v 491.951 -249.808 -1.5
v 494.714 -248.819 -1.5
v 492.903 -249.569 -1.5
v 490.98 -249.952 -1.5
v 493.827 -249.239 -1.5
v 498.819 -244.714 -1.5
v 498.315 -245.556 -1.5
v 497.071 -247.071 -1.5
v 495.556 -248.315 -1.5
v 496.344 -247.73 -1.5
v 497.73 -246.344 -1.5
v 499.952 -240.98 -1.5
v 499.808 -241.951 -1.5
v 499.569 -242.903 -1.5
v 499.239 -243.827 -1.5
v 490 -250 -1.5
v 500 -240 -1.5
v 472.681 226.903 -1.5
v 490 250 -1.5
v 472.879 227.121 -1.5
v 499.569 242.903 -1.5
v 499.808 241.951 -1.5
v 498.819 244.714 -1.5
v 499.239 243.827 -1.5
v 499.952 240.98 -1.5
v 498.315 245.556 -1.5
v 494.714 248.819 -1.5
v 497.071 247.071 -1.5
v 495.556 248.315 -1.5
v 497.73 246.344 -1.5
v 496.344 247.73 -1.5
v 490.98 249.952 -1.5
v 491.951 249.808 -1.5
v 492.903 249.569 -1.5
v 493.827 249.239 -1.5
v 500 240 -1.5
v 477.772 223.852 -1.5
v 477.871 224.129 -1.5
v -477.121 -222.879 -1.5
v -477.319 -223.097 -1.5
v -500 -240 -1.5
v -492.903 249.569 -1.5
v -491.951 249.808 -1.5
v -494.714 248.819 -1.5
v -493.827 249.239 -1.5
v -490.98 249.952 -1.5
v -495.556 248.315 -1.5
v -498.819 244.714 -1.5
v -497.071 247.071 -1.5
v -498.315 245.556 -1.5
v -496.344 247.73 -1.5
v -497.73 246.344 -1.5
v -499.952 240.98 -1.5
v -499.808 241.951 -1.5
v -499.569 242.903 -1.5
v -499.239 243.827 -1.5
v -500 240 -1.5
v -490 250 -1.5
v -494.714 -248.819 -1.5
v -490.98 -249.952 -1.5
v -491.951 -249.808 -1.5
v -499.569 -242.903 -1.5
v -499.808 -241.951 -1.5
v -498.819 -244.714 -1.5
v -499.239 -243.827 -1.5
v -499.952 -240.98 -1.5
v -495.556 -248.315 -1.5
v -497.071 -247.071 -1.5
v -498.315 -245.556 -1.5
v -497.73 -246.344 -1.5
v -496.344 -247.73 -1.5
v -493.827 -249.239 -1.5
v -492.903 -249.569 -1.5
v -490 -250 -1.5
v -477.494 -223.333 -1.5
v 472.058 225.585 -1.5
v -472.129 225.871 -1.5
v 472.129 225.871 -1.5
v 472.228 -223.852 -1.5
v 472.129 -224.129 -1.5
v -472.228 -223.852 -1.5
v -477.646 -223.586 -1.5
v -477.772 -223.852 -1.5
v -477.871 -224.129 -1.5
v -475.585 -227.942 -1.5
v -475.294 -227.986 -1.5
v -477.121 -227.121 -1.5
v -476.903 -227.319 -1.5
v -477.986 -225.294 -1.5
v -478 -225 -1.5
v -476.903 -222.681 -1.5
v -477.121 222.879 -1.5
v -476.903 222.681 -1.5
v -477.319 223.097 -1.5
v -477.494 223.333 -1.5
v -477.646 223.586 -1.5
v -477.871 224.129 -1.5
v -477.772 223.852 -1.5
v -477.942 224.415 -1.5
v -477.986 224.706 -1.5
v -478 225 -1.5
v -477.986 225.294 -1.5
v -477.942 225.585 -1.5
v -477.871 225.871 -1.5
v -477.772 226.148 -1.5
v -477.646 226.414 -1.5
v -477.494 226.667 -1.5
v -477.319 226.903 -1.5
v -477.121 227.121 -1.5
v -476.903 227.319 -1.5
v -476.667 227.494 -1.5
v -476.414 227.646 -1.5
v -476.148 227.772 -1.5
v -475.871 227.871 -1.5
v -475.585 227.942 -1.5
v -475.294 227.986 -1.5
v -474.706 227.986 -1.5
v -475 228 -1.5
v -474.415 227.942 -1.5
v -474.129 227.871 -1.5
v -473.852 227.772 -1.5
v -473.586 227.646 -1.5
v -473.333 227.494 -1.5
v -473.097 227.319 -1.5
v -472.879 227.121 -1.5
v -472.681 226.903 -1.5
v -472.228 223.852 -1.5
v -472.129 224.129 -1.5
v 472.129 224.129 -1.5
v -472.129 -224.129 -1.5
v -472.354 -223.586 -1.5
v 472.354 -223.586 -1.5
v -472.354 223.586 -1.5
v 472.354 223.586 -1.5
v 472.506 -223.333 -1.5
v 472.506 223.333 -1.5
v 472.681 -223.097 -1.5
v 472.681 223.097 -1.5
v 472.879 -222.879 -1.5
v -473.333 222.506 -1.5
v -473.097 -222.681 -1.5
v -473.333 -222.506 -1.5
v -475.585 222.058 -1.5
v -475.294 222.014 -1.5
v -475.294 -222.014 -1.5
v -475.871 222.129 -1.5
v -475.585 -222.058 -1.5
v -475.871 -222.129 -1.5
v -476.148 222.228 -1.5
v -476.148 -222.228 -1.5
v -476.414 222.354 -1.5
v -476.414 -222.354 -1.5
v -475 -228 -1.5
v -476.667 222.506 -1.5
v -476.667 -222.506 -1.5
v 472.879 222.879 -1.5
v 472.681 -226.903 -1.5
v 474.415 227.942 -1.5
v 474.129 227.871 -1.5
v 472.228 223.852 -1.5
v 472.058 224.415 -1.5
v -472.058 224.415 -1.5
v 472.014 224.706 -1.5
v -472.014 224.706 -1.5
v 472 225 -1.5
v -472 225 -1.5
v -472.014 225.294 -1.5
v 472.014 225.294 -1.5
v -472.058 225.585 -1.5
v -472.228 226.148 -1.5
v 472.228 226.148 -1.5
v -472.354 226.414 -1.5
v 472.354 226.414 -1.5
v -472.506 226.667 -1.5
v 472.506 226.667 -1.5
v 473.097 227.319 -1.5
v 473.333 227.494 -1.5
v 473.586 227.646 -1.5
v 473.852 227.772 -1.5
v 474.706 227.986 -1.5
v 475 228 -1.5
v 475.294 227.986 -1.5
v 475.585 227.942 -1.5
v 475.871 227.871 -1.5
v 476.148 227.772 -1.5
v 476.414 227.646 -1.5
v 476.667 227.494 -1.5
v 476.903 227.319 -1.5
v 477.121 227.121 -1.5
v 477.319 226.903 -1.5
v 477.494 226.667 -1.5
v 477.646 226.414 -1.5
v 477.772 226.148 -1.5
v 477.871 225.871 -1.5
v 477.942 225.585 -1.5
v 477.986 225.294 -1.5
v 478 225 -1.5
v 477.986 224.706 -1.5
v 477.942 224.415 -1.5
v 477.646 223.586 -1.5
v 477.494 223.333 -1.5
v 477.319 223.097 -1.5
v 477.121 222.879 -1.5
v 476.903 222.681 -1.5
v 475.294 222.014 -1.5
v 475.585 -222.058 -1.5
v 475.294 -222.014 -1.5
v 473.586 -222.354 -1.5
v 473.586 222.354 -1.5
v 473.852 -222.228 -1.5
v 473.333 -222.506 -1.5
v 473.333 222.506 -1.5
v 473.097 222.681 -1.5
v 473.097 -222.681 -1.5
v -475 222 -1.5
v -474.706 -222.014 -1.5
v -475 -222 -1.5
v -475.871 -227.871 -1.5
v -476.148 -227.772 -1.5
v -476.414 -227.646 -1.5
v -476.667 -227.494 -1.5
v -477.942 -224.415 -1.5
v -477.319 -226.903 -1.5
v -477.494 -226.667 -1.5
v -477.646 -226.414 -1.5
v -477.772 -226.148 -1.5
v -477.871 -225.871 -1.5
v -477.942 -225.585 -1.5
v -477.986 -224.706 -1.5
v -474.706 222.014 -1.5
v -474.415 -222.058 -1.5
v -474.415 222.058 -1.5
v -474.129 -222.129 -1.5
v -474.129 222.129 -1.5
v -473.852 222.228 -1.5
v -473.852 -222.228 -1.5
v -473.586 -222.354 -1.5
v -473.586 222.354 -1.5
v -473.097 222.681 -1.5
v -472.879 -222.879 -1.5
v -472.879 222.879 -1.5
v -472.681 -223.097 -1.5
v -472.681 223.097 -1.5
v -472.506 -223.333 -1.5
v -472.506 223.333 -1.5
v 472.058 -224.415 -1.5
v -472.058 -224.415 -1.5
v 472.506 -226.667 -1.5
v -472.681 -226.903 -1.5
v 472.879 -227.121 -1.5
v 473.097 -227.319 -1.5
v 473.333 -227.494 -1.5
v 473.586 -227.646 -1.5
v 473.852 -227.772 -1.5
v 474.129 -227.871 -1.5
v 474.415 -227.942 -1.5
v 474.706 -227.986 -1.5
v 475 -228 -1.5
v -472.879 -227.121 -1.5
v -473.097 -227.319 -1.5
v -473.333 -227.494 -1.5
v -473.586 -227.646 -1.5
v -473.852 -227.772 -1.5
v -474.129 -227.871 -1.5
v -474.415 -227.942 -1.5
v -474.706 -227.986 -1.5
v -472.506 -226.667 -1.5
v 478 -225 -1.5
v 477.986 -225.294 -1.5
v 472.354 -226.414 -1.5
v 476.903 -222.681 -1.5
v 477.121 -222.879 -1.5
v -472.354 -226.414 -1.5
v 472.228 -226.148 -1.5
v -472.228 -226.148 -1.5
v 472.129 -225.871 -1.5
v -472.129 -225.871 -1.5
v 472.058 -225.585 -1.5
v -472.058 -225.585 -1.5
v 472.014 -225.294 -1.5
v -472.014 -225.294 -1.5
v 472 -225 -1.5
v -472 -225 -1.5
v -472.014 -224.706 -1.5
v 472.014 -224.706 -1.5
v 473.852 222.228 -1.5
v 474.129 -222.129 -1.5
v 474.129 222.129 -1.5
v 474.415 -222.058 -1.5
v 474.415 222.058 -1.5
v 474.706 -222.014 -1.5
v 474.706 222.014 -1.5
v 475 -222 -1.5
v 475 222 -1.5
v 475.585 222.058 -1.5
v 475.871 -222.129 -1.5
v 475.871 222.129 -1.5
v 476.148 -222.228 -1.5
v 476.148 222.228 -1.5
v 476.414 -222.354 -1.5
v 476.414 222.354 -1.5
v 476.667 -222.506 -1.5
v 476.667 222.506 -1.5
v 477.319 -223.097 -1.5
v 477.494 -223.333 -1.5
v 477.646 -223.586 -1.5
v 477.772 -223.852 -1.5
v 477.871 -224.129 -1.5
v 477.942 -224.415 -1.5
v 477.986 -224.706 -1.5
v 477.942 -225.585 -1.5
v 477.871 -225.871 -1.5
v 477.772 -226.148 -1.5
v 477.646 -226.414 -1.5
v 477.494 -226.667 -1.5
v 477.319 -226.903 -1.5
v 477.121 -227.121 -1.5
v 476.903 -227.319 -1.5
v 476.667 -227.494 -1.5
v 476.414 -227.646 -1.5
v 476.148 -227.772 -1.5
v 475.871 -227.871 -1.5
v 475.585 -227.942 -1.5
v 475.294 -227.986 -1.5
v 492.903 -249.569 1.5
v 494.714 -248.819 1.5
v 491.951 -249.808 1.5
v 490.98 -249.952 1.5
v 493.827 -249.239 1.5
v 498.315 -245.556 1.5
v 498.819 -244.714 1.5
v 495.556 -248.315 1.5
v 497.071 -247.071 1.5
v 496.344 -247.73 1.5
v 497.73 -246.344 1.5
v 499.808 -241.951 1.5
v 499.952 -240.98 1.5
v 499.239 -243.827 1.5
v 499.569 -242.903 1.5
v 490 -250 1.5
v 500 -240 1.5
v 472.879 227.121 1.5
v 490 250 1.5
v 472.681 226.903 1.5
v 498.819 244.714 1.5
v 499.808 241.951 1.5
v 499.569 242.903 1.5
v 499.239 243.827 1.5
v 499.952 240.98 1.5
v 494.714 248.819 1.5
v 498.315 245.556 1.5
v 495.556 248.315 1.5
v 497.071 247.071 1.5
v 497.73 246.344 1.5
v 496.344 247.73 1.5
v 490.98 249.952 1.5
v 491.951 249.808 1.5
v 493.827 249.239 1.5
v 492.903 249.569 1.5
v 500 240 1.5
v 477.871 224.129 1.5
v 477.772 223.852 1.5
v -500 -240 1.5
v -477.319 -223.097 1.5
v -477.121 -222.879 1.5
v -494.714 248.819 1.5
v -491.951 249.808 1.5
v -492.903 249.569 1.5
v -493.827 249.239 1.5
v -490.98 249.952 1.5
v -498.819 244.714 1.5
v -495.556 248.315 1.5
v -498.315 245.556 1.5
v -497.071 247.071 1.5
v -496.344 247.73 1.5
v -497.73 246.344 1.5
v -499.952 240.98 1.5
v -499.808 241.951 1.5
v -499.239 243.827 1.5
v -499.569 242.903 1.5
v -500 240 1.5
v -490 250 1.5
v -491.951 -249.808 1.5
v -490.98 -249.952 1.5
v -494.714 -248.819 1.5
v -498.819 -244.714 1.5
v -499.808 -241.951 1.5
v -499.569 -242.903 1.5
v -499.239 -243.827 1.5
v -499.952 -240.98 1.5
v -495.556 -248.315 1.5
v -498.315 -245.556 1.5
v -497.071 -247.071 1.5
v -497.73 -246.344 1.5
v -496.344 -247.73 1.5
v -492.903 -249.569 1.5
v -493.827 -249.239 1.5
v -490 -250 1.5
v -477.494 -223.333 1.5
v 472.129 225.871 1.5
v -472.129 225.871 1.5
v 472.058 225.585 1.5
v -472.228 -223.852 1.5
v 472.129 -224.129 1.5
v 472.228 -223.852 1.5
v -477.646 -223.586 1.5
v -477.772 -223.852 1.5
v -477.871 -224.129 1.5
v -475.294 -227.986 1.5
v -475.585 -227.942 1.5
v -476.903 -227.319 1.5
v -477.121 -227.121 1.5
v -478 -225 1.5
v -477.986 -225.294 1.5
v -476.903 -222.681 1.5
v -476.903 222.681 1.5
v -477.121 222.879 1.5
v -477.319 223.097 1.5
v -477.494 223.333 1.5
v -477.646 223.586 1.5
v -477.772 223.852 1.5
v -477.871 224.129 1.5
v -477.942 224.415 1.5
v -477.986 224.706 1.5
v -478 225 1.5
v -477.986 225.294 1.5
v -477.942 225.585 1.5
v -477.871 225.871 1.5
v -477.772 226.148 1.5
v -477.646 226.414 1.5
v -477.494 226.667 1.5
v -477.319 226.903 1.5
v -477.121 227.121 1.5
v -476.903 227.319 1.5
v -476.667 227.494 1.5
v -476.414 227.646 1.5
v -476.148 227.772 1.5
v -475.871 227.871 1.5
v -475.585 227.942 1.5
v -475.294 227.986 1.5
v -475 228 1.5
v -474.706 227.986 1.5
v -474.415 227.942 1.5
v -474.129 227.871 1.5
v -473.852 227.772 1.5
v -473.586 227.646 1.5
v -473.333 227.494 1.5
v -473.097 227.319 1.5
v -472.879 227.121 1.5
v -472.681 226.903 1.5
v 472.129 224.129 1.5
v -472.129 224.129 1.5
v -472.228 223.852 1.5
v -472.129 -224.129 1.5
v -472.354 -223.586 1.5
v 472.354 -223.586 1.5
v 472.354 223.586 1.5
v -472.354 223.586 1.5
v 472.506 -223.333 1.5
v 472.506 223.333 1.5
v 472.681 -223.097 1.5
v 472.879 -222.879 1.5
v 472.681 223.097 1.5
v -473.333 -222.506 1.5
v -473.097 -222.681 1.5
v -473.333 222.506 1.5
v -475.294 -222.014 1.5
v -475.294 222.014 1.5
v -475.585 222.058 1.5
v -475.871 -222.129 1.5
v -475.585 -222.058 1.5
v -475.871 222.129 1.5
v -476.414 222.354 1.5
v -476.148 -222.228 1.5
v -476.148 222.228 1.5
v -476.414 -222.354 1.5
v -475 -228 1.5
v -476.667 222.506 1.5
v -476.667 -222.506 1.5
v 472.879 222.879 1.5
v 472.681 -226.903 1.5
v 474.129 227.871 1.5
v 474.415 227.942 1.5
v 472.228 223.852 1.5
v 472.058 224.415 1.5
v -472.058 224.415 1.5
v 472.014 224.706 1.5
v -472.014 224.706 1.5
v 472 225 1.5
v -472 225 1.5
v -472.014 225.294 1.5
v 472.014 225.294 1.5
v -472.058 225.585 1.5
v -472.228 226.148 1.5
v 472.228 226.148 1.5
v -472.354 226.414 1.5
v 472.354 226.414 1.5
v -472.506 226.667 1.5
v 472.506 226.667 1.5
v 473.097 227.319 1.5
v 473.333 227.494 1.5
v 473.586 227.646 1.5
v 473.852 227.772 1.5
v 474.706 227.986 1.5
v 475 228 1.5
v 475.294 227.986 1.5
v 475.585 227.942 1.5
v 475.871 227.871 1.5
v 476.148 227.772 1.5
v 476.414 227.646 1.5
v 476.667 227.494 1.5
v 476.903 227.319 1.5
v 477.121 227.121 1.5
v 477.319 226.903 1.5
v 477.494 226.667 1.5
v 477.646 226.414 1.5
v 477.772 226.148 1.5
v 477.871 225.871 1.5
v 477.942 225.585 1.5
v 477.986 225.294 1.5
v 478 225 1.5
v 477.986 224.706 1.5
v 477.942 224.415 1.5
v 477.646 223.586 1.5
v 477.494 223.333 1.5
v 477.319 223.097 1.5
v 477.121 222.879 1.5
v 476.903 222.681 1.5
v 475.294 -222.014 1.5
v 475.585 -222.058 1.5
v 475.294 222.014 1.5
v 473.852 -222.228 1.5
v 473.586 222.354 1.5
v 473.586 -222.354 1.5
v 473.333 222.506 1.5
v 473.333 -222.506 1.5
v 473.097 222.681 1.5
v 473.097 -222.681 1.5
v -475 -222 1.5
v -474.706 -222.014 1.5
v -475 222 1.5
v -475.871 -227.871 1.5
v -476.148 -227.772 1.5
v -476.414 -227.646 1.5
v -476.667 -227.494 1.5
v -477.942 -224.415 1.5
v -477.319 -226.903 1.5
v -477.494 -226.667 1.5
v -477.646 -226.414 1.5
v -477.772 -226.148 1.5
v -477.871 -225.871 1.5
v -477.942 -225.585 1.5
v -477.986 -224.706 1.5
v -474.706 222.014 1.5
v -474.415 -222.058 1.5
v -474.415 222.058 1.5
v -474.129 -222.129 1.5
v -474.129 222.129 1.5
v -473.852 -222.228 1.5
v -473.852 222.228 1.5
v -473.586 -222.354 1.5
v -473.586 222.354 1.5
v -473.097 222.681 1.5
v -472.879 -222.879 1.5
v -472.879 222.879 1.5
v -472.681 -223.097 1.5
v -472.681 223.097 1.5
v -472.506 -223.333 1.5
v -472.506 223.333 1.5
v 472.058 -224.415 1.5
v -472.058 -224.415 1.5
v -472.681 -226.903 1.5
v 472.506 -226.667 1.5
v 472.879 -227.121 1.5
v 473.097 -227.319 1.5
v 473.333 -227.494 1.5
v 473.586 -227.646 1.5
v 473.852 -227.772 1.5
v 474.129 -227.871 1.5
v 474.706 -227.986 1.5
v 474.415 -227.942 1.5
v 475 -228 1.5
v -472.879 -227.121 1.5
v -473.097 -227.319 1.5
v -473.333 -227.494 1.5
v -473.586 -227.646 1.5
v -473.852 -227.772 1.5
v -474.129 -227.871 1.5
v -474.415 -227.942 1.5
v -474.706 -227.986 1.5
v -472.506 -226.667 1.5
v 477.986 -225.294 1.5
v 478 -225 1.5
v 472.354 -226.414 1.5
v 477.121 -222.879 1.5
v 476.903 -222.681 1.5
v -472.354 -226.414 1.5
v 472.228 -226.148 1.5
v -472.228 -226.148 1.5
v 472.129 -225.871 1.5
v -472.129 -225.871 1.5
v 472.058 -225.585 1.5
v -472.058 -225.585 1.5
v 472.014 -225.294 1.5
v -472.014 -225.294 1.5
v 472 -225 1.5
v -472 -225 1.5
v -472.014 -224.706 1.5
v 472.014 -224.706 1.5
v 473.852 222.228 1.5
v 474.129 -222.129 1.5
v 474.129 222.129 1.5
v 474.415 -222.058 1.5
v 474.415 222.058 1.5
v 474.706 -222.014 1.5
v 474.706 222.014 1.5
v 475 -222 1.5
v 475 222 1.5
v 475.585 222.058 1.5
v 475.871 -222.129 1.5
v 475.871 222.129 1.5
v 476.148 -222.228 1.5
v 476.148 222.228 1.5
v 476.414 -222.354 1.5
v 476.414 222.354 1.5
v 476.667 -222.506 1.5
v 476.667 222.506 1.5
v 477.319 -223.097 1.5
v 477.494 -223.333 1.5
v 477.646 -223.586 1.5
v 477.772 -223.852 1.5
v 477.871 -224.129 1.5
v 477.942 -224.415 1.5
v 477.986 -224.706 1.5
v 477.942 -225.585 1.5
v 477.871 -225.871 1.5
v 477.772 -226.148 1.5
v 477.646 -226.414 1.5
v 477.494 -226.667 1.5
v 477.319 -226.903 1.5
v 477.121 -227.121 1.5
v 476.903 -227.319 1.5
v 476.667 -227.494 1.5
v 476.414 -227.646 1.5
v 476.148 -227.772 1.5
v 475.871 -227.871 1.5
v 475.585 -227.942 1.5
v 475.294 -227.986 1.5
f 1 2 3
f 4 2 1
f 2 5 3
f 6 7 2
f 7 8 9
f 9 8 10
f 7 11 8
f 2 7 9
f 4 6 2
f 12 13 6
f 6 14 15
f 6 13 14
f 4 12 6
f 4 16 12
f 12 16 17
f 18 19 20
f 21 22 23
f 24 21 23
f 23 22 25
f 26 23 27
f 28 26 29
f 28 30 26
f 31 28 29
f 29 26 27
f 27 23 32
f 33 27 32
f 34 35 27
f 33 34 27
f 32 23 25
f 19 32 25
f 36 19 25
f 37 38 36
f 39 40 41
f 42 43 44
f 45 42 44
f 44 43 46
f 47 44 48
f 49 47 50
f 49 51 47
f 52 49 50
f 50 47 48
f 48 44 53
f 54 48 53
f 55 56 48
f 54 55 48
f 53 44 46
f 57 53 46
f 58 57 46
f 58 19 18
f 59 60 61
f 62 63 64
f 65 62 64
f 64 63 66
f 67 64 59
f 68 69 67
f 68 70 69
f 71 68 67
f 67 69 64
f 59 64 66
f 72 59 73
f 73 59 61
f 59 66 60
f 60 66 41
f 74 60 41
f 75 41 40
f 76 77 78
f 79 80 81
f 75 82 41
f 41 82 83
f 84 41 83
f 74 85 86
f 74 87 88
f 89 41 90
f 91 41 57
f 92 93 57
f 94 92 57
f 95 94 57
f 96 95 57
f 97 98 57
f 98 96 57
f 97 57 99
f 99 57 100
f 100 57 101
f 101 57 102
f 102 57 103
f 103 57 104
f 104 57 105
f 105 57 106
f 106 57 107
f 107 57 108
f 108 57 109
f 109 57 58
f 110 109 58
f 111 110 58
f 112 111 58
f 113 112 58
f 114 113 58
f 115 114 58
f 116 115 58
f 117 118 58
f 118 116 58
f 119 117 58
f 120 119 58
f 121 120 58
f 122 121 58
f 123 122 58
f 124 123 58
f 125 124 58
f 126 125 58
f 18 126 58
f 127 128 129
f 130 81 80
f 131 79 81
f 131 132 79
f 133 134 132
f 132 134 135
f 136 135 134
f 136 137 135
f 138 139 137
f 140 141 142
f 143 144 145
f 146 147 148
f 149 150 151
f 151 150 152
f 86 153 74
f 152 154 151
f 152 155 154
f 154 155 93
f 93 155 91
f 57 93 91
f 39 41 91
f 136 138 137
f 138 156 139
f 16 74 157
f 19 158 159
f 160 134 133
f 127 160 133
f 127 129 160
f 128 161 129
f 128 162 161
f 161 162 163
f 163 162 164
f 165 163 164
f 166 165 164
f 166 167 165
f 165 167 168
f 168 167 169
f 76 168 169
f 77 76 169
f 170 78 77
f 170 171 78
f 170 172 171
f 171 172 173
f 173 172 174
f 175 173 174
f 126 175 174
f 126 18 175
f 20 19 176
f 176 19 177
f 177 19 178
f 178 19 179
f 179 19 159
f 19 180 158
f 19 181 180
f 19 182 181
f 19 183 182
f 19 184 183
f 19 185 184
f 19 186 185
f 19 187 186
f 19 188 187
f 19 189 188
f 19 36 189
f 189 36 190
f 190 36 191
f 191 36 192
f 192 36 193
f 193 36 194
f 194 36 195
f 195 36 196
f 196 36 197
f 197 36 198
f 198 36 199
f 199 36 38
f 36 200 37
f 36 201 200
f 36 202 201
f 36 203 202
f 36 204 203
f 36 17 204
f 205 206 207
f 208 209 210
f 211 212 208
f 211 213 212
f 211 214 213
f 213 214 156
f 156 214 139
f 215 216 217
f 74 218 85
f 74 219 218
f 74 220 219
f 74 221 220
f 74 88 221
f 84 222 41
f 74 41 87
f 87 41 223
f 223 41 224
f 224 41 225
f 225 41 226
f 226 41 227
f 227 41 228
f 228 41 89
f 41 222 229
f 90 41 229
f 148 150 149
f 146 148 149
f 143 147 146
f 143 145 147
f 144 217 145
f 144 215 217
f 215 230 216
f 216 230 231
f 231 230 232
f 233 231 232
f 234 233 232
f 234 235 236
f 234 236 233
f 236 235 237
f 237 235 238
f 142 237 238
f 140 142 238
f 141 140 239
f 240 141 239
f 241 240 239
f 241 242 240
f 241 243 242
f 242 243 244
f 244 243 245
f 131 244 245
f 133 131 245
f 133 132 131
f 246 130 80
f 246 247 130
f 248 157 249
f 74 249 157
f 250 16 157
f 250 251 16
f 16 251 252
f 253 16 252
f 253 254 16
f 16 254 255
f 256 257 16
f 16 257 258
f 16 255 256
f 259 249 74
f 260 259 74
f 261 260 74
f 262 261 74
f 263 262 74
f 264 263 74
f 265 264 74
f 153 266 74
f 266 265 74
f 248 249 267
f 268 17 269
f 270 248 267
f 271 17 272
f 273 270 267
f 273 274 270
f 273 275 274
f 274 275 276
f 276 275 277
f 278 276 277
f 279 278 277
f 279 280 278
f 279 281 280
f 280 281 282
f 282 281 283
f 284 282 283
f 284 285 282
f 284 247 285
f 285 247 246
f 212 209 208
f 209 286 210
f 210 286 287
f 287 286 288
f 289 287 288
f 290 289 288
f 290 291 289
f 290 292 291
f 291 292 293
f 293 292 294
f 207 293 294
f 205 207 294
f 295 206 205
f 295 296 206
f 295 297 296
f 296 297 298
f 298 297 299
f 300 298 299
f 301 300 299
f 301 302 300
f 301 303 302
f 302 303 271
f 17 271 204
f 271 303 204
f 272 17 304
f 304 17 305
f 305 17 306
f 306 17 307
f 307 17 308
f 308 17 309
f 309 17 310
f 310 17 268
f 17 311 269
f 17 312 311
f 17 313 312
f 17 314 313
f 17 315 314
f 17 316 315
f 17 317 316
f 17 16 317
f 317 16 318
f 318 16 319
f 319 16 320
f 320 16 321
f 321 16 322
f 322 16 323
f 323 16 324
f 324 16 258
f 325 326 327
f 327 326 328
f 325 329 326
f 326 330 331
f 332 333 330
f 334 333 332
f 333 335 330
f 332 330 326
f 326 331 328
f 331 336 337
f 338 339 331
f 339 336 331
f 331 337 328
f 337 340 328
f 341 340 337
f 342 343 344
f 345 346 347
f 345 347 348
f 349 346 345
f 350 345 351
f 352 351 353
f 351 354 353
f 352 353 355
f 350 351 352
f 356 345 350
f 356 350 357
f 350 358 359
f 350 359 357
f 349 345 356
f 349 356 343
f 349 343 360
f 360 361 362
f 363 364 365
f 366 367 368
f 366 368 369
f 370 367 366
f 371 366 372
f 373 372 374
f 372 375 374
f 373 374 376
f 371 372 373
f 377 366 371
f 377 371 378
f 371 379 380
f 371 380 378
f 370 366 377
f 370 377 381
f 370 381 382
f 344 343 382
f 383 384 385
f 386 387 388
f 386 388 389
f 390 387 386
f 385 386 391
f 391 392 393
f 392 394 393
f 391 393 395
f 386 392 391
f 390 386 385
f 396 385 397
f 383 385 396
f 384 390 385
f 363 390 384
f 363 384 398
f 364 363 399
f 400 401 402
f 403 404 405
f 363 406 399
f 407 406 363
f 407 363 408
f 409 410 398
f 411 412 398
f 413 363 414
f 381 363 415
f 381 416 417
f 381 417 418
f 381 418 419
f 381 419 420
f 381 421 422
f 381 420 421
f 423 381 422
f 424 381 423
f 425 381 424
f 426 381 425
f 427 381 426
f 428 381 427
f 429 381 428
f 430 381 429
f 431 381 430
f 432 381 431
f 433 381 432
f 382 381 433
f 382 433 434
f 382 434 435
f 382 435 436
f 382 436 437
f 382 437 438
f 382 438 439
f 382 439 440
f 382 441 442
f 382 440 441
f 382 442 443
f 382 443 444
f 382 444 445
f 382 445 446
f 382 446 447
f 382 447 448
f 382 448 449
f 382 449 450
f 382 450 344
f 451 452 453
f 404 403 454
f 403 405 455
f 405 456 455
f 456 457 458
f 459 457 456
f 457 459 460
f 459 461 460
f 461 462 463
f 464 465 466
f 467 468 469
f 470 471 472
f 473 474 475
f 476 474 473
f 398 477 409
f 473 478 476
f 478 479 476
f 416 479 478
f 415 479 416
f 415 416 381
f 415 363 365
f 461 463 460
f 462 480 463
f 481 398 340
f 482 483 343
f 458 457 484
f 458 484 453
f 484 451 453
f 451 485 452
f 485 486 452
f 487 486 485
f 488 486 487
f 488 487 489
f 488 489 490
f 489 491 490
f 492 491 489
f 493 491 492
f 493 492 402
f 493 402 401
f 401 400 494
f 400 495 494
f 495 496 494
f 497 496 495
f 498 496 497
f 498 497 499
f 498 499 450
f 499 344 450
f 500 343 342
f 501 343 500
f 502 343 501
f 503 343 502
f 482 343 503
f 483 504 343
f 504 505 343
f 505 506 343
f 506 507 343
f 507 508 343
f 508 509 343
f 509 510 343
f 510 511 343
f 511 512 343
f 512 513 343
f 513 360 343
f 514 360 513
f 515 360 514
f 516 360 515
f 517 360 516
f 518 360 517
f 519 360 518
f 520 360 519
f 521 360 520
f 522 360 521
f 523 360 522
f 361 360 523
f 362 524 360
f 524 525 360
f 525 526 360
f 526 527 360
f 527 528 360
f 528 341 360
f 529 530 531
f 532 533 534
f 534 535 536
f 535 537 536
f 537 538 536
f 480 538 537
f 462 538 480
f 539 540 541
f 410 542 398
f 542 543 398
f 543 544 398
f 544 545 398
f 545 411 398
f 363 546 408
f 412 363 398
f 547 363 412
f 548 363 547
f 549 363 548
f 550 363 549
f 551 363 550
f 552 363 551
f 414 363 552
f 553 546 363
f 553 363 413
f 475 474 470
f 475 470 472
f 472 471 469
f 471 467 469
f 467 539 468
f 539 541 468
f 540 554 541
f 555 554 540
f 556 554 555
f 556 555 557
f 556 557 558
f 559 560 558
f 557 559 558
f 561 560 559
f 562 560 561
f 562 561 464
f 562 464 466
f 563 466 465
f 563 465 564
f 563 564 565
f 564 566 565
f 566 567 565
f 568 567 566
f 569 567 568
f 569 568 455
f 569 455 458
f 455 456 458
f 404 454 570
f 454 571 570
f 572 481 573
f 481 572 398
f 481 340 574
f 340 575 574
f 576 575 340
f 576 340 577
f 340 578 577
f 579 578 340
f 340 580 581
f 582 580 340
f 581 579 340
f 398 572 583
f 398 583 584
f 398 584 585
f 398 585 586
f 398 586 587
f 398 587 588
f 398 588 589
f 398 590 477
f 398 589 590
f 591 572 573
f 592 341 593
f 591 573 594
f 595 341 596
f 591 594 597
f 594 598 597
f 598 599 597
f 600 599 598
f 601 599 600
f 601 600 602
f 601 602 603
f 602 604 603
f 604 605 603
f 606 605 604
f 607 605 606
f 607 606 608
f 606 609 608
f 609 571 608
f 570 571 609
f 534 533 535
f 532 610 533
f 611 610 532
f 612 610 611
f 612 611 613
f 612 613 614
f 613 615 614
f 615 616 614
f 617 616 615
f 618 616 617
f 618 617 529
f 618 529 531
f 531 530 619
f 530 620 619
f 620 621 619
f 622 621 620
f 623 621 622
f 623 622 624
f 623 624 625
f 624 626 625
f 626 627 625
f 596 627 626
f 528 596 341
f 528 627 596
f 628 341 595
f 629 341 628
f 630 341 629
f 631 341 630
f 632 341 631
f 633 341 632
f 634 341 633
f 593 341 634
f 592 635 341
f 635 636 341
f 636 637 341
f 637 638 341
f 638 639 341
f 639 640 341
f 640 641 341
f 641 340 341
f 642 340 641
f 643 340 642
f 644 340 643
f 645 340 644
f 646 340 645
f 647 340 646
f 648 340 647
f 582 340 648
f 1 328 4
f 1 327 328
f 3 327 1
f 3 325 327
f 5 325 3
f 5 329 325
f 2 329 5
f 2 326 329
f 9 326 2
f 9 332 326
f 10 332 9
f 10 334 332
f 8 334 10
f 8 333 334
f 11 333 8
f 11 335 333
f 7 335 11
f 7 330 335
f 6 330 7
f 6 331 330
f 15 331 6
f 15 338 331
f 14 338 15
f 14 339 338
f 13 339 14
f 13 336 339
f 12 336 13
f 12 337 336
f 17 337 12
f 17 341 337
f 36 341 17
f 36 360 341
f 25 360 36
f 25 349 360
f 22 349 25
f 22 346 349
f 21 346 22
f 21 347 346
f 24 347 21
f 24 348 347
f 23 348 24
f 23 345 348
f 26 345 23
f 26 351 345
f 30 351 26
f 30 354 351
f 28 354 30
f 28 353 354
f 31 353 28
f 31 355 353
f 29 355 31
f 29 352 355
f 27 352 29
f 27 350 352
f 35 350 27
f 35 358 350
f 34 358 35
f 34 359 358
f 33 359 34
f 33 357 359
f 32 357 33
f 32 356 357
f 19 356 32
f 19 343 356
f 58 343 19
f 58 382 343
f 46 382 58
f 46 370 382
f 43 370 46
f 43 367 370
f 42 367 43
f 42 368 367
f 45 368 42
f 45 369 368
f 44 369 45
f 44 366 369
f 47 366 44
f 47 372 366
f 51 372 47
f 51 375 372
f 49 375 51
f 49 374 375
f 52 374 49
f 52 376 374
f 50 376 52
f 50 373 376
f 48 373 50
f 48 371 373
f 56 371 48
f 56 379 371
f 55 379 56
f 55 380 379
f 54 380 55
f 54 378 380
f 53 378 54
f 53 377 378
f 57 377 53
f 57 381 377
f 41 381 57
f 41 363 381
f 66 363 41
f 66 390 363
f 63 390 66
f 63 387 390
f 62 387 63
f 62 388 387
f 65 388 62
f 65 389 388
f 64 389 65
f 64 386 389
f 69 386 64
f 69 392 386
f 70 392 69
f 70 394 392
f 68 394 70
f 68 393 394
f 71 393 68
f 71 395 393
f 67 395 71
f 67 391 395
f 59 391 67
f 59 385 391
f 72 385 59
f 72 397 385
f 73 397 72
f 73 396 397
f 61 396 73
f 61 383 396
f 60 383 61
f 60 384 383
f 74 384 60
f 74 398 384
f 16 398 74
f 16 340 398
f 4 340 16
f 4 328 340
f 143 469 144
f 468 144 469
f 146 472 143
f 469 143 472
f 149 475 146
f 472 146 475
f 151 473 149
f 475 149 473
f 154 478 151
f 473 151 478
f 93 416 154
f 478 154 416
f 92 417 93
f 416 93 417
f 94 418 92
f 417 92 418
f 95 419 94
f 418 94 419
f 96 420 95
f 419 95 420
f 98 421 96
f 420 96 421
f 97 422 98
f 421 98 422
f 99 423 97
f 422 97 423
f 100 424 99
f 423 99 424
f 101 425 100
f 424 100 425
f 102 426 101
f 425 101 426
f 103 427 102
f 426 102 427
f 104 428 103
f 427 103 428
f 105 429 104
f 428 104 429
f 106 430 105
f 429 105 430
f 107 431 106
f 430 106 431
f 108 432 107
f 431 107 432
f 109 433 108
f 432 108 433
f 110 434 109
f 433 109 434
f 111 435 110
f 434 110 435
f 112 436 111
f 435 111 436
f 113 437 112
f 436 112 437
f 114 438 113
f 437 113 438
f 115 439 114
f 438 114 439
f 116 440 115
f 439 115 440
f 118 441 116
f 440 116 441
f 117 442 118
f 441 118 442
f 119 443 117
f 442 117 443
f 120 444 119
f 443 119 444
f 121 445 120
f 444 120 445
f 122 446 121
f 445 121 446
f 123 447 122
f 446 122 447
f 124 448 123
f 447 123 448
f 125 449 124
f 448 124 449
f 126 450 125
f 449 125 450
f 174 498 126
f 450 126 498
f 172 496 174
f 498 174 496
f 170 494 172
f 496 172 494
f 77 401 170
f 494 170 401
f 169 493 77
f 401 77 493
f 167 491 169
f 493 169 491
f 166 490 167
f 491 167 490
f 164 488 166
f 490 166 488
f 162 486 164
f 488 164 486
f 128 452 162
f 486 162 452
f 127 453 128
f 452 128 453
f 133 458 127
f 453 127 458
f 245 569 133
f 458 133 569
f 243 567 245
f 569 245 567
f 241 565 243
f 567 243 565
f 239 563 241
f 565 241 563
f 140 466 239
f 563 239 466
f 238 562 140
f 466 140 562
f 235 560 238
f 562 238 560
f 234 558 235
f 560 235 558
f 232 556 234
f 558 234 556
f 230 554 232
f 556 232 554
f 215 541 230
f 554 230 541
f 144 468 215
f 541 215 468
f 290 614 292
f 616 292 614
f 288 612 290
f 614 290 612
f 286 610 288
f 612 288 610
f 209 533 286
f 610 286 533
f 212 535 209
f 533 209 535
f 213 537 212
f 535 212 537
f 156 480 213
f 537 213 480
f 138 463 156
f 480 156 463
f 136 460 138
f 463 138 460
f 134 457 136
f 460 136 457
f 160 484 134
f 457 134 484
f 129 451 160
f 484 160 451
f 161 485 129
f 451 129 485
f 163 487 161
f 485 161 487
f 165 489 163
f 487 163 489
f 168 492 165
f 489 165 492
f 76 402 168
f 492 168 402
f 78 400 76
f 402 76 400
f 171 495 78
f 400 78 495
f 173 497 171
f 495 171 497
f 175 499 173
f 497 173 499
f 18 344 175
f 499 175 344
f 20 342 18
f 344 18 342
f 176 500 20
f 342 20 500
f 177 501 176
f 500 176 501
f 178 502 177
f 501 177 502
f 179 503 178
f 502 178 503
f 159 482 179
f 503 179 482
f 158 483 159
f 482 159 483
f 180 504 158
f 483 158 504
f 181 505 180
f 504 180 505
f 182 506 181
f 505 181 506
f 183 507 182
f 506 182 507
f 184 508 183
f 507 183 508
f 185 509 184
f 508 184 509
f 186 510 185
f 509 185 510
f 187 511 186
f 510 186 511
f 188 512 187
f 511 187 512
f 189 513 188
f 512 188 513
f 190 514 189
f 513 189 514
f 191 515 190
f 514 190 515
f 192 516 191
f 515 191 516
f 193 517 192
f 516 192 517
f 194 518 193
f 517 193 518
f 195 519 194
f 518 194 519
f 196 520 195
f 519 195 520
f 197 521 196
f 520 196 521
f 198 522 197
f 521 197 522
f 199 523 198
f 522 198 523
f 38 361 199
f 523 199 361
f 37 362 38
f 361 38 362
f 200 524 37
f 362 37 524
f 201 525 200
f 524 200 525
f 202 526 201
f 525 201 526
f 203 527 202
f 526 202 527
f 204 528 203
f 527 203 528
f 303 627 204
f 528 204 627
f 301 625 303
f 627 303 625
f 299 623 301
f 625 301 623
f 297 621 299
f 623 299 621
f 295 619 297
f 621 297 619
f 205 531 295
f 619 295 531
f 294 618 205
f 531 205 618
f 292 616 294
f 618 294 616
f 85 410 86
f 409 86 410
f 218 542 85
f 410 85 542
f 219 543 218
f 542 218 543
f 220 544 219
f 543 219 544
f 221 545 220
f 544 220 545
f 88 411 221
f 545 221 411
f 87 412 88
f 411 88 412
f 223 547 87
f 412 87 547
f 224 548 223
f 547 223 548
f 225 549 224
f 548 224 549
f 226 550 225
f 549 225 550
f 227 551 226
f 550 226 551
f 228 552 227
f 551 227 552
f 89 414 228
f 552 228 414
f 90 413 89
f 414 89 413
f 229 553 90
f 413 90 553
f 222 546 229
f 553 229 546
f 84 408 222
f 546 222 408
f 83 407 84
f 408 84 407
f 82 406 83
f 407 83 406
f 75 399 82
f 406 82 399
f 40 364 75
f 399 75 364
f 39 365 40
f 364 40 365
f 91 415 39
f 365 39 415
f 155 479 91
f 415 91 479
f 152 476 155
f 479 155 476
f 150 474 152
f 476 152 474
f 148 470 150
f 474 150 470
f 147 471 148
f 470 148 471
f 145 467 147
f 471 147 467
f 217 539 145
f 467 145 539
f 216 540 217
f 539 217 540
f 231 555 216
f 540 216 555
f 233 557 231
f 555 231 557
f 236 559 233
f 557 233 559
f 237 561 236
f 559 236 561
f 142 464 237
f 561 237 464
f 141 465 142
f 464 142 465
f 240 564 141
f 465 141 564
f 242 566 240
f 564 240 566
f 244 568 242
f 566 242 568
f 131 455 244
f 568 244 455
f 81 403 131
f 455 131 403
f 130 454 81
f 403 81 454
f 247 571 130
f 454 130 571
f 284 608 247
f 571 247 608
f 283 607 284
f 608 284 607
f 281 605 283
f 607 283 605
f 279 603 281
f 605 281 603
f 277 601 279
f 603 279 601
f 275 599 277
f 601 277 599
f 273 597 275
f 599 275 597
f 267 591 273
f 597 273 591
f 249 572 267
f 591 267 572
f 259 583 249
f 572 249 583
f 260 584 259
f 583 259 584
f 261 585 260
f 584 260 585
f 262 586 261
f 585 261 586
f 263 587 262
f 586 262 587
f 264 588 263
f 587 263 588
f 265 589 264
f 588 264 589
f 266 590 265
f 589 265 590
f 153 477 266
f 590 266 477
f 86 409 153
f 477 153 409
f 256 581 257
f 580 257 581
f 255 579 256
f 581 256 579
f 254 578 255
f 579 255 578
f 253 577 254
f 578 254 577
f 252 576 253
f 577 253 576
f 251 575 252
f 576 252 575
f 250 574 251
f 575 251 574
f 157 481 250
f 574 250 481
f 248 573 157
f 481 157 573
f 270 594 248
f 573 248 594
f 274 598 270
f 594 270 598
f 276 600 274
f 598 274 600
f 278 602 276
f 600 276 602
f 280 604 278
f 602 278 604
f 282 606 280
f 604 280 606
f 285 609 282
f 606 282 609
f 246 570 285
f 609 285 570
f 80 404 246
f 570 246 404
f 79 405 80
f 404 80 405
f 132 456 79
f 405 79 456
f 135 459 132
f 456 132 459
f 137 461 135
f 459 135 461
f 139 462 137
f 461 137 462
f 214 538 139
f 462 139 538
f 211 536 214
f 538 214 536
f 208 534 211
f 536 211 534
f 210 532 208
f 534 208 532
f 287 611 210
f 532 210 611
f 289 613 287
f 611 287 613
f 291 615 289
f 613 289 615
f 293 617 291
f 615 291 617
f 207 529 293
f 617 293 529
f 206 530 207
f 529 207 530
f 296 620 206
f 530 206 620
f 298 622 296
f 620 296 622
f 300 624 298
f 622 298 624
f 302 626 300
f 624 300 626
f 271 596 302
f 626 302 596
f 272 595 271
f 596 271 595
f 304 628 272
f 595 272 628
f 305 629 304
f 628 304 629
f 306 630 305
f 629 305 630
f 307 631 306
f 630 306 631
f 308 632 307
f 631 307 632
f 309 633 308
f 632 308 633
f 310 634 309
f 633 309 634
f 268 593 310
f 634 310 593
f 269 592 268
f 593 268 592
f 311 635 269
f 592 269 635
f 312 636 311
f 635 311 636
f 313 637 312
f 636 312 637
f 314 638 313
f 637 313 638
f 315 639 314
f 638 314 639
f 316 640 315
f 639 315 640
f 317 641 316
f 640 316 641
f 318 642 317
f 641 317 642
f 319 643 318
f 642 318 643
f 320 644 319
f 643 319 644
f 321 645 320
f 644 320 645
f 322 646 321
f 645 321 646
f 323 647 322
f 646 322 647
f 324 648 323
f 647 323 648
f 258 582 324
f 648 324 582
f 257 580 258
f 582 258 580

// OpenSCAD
// Sheet DiBond (aluminum composite panel) with rounded corners and mounting holes.
// Single connected solid (one extruded body) for reliable rendering.

// ---------- Parameters ----------
sheet_length = 1000; //[500:2000:1]
sheet_width  = 500;  //[250:1000:1]
sheet_thickness = 3; //[1.5:6:0.1]

corner_radius = 10;  //[0:50:1]

hole_diameter = 6;   //[2:20:0.5]
hole_edge_offset = 25; //[10:100:1]

overlap = 0.5;       //[0.1:2:0.1]

$fn = 64;

// ---------- Helpers ----------
function clamp(x, a, b) = x < a ? a : (x > b ? b : x);

L = sheet_length;
W = sheet_width;
T = sheet_thickness;

r = clamp(corner_radius, 0, min(L, W)/2 - 0.01);
hole_r = hole_diameter/2;

// Keep holes inside the panel
hole_off = clamp(hole_edge_offset, hole_r + 0.5, min(L, W)/2 - hole_r - 0.5);

// ---------- 2D Profile ----------
module rounded_rect_2d(len, wid, rad) {
    rad2 = clamp(rad, 0, min(len, wid)/2);
    if (rad2 <= 0) {
        square([len, wid], center=true);
    } else {
        hull() {
            for (sx = [-1, 1], sy = [-1, 1])
                translate([sx*(len/2 - rad2), sy*(wid/2 - rad2)])
                    circle(r=rad2);
        }
    }
}

module holes_2d() {
    for (sx = [-1, 1], sy = [-1, 1])
        translate([sx*(L/2 - hole_off), sy*(W/2 - hole_off)])
            circle(r=hole_r);
}

// ---------- Final Solid ----------
linear_extrude(height=T, center=true, convexity=10)
difference() {
    rounded_rect_2d(L, W, r);
    holes_2d();
}
